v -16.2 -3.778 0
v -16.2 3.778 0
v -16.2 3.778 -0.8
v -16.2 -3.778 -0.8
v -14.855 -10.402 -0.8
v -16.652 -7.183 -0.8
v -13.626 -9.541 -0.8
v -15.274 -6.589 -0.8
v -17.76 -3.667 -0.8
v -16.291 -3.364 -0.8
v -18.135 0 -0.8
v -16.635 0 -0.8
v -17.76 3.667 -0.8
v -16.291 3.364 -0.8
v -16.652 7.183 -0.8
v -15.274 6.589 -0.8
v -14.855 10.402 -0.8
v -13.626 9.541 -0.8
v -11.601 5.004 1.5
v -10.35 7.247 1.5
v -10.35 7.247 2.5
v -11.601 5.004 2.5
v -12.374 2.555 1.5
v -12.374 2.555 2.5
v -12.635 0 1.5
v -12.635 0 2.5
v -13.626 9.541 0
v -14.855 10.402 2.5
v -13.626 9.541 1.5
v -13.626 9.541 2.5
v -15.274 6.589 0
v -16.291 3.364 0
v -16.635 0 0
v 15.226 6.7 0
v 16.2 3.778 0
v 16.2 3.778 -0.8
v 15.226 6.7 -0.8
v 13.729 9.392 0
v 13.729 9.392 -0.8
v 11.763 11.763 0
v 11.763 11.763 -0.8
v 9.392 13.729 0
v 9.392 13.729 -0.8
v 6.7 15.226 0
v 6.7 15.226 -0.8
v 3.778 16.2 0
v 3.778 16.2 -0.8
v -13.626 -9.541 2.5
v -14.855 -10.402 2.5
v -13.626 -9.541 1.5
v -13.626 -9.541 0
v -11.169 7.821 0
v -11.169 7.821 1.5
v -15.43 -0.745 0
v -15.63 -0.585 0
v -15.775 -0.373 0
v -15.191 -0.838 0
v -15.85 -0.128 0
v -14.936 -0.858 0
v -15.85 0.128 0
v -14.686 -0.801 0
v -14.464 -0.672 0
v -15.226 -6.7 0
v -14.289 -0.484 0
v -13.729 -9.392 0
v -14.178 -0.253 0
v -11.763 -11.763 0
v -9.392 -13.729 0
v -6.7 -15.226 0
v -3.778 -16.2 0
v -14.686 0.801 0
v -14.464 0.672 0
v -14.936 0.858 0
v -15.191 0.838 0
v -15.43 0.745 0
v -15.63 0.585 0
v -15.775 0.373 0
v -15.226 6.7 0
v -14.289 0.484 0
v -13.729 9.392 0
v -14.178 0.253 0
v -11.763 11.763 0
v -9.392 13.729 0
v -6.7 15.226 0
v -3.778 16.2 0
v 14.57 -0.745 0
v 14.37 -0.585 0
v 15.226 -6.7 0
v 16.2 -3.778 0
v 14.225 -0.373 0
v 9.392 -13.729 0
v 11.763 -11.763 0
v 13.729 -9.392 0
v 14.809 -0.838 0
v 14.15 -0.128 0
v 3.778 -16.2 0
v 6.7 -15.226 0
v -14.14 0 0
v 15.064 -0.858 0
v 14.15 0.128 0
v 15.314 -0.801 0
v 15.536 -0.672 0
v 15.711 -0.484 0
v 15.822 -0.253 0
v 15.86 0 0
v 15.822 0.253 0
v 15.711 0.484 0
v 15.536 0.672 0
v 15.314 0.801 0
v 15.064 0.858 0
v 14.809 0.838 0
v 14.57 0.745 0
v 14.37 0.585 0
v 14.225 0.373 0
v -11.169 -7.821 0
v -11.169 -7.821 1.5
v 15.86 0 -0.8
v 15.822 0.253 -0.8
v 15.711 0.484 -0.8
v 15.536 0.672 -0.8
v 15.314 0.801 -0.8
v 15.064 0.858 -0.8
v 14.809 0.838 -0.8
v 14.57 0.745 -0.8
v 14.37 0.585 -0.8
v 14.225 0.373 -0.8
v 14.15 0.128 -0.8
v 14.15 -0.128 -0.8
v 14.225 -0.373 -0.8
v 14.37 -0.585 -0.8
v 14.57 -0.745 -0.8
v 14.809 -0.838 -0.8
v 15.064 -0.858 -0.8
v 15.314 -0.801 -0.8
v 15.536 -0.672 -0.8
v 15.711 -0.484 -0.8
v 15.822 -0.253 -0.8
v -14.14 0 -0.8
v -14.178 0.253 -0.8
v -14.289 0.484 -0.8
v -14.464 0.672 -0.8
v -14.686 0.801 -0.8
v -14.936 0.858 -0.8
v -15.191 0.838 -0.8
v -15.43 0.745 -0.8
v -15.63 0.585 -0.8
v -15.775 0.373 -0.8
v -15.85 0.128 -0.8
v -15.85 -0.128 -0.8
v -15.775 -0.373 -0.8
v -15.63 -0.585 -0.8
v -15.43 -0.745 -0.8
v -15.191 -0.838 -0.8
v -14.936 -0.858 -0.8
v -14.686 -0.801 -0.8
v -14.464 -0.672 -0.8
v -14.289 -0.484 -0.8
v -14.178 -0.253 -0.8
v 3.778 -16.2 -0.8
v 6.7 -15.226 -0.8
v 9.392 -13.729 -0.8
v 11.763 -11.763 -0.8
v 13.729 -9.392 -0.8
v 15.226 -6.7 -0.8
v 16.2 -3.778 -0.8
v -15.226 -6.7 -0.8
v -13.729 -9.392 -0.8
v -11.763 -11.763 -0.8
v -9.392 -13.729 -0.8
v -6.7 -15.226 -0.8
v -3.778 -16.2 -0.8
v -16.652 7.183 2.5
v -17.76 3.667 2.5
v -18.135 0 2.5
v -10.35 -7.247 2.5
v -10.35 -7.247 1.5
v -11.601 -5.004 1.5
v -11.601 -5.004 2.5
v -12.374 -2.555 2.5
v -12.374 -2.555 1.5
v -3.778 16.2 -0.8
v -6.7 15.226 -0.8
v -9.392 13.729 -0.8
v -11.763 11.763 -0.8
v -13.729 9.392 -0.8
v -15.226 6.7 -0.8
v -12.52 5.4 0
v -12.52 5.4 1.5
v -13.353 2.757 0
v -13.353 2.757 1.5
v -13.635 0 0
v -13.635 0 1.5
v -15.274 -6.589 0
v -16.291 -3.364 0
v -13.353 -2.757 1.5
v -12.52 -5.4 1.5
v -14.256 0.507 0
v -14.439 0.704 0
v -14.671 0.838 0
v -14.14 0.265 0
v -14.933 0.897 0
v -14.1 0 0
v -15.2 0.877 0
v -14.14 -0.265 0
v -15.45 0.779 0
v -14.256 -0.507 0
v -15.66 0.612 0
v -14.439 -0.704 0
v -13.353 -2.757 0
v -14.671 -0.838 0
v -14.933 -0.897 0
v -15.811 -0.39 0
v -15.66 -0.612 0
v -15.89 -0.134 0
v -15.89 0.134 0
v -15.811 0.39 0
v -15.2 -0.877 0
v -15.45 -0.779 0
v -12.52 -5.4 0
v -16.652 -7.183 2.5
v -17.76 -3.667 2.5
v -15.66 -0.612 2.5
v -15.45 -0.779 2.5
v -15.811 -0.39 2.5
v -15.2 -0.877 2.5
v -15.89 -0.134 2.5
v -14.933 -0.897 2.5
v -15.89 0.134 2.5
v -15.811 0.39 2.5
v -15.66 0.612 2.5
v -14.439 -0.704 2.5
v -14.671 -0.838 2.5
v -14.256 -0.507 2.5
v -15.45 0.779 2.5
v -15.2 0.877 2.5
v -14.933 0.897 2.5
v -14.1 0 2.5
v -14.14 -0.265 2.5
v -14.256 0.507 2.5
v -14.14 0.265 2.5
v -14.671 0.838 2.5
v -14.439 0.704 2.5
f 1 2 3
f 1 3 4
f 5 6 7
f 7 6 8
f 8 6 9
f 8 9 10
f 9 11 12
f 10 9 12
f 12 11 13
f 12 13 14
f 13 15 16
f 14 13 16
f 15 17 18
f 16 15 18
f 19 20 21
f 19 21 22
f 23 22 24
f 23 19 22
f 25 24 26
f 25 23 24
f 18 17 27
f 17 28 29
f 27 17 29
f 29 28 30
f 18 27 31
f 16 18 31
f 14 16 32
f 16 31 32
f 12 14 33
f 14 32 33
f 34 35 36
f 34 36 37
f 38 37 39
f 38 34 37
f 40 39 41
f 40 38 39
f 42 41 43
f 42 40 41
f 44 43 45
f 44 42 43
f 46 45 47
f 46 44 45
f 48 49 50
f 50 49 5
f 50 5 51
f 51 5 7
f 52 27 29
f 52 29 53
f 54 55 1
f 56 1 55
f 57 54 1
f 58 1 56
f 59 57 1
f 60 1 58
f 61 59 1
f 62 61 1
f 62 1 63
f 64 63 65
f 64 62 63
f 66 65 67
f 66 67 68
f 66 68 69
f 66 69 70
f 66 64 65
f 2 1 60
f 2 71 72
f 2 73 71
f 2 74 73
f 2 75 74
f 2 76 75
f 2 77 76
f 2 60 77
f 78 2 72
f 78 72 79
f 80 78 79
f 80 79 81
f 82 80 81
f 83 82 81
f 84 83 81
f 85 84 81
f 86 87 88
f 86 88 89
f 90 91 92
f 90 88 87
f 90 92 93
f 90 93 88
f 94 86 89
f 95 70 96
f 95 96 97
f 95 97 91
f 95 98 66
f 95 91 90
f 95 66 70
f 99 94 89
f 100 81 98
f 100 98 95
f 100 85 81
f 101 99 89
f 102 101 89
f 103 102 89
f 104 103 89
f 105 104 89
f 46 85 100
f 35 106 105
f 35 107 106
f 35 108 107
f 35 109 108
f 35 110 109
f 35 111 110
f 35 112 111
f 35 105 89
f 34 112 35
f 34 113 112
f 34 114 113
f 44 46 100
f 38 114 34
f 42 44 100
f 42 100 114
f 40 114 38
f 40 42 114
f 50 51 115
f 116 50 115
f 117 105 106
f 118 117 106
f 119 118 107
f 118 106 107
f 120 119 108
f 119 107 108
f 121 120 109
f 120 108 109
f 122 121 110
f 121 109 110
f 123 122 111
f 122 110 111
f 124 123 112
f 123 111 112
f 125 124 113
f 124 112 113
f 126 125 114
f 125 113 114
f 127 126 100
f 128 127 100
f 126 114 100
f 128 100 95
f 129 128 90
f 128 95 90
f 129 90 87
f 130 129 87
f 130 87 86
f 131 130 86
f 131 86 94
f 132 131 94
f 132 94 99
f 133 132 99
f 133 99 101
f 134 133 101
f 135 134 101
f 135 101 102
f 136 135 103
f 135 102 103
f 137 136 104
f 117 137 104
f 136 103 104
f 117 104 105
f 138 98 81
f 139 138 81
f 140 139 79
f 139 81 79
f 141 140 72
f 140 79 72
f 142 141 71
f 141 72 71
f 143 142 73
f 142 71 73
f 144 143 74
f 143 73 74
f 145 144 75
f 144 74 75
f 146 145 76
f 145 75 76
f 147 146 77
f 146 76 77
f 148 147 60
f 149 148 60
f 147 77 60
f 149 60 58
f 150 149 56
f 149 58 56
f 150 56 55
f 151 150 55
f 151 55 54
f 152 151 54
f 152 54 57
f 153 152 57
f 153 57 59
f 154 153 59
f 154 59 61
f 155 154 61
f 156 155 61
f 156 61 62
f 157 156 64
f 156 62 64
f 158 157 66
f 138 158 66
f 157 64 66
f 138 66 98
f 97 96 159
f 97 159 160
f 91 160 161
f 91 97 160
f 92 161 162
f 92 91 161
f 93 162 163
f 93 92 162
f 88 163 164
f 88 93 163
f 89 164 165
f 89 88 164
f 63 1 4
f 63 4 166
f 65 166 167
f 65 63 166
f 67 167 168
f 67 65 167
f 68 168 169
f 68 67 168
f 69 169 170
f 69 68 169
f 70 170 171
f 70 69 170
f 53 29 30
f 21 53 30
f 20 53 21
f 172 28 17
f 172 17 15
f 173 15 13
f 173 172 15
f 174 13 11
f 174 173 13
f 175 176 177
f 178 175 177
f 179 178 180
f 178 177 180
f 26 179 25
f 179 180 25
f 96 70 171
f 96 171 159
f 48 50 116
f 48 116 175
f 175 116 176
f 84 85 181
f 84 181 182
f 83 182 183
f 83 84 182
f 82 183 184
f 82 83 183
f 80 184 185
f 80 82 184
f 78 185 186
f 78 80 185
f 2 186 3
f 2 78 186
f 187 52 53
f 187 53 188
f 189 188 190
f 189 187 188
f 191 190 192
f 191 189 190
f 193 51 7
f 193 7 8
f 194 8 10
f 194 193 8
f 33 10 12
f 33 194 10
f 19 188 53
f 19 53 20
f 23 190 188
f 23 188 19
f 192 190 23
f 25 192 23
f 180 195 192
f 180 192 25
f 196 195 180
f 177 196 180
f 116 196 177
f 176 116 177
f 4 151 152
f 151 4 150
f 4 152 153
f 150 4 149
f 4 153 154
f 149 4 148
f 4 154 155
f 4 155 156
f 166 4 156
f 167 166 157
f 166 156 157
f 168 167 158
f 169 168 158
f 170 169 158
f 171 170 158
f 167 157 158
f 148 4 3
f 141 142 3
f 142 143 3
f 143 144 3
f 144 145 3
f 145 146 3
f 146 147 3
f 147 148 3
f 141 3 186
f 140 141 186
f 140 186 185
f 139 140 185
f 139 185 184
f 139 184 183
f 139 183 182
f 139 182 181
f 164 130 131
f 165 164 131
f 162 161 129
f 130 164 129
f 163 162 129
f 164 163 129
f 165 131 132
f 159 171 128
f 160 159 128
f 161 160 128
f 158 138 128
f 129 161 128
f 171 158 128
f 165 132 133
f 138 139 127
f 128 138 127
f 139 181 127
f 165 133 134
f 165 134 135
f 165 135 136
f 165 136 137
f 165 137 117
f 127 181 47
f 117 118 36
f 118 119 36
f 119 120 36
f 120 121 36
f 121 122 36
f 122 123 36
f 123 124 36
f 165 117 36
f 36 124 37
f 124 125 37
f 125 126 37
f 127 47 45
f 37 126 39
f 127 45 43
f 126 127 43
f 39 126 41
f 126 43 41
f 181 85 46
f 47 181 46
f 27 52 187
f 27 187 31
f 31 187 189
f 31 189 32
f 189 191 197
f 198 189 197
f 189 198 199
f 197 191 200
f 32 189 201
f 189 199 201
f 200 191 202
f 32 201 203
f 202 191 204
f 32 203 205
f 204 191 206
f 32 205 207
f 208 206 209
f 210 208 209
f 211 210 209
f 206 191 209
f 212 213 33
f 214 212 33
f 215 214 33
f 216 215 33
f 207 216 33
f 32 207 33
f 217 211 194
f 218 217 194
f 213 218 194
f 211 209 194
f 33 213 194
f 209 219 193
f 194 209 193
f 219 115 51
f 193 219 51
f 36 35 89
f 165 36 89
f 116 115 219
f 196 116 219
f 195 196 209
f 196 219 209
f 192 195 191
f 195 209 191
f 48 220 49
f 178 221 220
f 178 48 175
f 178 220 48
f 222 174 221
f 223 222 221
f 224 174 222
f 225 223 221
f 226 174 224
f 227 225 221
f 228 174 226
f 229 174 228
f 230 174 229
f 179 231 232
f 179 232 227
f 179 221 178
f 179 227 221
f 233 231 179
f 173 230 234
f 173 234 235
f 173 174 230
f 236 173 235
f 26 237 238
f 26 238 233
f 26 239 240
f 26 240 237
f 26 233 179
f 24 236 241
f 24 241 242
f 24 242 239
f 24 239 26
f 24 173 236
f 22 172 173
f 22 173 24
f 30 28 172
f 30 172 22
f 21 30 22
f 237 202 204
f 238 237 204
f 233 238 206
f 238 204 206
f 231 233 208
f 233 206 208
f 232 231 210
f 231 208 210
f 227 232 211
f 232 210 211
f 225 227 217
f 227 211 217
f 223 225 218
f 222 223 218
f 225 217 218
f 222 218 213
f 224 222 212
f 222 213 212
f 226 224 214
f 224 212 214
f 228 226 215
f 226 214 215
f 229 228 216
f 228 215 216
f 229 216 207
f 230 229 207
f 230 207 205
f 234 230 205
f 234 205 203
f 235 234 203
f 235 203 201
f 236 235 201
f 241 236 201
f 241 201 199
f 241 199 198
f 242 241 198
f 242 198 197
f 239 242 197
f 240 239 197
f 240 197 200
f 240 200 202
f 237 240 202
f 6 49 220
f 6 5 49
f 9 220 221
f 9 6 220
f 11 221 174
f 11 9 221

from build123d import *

# Parameters (mm, degrees)
SKETCH_R          = 0.86
PAD_DEPTH         = 0.8
PAD001_DEPTH      = 1.5
PAD002_DEPTH      = 1
PAD003_DEPTH      = 0.8
PAD003_DEPTH_BACK = 2.5
SKETCH004_R       = 0.9
HOLE_DEPTH        = 25


with BuildPart() as colorleddeck:
    # Sketch → Pad (new body)
    with BuildSketch(Plane.XY):
        with BuildLine():
            ThreePointArc((-16.2, -3.777995), (-11.762509, -11.762509), (-3.777995, -16.2))
            Line((-3.777995, -16.2), (3.777995, -16.2))
            ThreePointArc((3.777995, -16.2), (11.762509, -11.762509), (16.2, -3.777995))
            Line((16.2, 3.777995), (16.2, -3.777995))
            ThreePointArc((16.2, 3.777995), (11.762509, 11.762509), (3.777995, 16.2))
            Line((-3.777995, 16.2), (3.777995, 16.2))
            ThreePointArc((-3.777995, 16.2), (-11.762509, 11.762509), (-16.2, 3.777995))
            Line((-16.2, 3.777995), (-16.2, -3.777995))
        make_face()
        with Locations((-15, 0)):
            Circle(SKETCH_R, mode=Mode.SUBTRACT)
        with Locations((15, 0)):
            Circle(SKETCH_R, mode=Mode.SUBTRACT)
    extrude(amount=-PAD_DEPTH)


with BuildPart() as body:
    # Sketch001 → Pad001 (new body)
    with BuildSketch(Plane.XY):
        with BuildLine():
            ThreePointArc((-11.168892, 7.820543), (-13.003645, 4.100033), (-13.6347, 0))
            Line((-16.6347, 0), (-13.6347, 0))
            ThreePointArc((-13.626349, 9.541272), (-15.864795, 5.002151), (-16.6347, 0))
            Line((-13.626349, 9.541272), (-11.168892, 7.820543))
        make_face()
    pad001 = extrude(amount=PAD001_DEPTH)

    # Mirrored: Pad001 across XZ
    add(pad001.mirror(Plane.XZ))

    # Sketch002 (on Face4 of Mirrored) → Pad002 (join)
    with BuildSketch(Plane.XY.offset(1.5)):
        with BuildLine():
            ThreePointArc((-13.626349, 9.541272), (-15.864795, 5.002151), (-16.6347, 0))
            Line((-16.6347, 0), (-12.6347, 0))
            ThreePointArc((-10.34974, 7.246966), (-12.049928, 3.799328), (-12.6347, 0))
            Line((-13.626349, 9.541272), (-10.34974, 7.246966))
        make_face()
    pad002 = extrude(amount=PAD002_DEPTH)

    # Mirrored001: Pad002 across XZ
    add(pad002.mirror(Plane.XZ))

    # Sketch003 (on Face2 of Mirrored001) → Pad003 (join, two sides)
    with BuildSketch(Plane(origin=(0, 0, 0), x_dir=(1, 0, 0), z_dir=(0, 0, -1))) as pad003_sk:
        with BuildLine():
            ThreePointArc((-14.855077, 10.401637), (-17.295371, 5.453209), (-18.1347, 0))
            Line((-18.1347, 0), (-16.6347, 0))
            ThreePointArc((-13.626349, 9.541272), (-15.864795, 5.002151), (-16.6347, 0))
            Line((-14.855077, 10.401637), (-13.626349, 9.541272))
        make_face()
    pad003 = extrude(amount=PAD003_DEPTH) + extrude(pad003_sk.sketch, amount=-PAD003_DEPTH_BACK)

    # Mirrored002: Pad003 across XZ
    add(pad003.mirror(Plane.XZ))

    # Sketch004 (on Face2 of Mirrored002) → Hole (cut)
    with BuildSketch(Plane(origin=(0, 0, 0), x_dir=(1, 0, 0), z_dir=(0, 0, -1))):
        with Locations((-15, 0)):
            Circle(SKETCH004_R)
    extrude(amount=-HOLE_DEPTH, mode=Mode.SUBTRACT)


solid = Compound([colorleddeck.part, body.part])
